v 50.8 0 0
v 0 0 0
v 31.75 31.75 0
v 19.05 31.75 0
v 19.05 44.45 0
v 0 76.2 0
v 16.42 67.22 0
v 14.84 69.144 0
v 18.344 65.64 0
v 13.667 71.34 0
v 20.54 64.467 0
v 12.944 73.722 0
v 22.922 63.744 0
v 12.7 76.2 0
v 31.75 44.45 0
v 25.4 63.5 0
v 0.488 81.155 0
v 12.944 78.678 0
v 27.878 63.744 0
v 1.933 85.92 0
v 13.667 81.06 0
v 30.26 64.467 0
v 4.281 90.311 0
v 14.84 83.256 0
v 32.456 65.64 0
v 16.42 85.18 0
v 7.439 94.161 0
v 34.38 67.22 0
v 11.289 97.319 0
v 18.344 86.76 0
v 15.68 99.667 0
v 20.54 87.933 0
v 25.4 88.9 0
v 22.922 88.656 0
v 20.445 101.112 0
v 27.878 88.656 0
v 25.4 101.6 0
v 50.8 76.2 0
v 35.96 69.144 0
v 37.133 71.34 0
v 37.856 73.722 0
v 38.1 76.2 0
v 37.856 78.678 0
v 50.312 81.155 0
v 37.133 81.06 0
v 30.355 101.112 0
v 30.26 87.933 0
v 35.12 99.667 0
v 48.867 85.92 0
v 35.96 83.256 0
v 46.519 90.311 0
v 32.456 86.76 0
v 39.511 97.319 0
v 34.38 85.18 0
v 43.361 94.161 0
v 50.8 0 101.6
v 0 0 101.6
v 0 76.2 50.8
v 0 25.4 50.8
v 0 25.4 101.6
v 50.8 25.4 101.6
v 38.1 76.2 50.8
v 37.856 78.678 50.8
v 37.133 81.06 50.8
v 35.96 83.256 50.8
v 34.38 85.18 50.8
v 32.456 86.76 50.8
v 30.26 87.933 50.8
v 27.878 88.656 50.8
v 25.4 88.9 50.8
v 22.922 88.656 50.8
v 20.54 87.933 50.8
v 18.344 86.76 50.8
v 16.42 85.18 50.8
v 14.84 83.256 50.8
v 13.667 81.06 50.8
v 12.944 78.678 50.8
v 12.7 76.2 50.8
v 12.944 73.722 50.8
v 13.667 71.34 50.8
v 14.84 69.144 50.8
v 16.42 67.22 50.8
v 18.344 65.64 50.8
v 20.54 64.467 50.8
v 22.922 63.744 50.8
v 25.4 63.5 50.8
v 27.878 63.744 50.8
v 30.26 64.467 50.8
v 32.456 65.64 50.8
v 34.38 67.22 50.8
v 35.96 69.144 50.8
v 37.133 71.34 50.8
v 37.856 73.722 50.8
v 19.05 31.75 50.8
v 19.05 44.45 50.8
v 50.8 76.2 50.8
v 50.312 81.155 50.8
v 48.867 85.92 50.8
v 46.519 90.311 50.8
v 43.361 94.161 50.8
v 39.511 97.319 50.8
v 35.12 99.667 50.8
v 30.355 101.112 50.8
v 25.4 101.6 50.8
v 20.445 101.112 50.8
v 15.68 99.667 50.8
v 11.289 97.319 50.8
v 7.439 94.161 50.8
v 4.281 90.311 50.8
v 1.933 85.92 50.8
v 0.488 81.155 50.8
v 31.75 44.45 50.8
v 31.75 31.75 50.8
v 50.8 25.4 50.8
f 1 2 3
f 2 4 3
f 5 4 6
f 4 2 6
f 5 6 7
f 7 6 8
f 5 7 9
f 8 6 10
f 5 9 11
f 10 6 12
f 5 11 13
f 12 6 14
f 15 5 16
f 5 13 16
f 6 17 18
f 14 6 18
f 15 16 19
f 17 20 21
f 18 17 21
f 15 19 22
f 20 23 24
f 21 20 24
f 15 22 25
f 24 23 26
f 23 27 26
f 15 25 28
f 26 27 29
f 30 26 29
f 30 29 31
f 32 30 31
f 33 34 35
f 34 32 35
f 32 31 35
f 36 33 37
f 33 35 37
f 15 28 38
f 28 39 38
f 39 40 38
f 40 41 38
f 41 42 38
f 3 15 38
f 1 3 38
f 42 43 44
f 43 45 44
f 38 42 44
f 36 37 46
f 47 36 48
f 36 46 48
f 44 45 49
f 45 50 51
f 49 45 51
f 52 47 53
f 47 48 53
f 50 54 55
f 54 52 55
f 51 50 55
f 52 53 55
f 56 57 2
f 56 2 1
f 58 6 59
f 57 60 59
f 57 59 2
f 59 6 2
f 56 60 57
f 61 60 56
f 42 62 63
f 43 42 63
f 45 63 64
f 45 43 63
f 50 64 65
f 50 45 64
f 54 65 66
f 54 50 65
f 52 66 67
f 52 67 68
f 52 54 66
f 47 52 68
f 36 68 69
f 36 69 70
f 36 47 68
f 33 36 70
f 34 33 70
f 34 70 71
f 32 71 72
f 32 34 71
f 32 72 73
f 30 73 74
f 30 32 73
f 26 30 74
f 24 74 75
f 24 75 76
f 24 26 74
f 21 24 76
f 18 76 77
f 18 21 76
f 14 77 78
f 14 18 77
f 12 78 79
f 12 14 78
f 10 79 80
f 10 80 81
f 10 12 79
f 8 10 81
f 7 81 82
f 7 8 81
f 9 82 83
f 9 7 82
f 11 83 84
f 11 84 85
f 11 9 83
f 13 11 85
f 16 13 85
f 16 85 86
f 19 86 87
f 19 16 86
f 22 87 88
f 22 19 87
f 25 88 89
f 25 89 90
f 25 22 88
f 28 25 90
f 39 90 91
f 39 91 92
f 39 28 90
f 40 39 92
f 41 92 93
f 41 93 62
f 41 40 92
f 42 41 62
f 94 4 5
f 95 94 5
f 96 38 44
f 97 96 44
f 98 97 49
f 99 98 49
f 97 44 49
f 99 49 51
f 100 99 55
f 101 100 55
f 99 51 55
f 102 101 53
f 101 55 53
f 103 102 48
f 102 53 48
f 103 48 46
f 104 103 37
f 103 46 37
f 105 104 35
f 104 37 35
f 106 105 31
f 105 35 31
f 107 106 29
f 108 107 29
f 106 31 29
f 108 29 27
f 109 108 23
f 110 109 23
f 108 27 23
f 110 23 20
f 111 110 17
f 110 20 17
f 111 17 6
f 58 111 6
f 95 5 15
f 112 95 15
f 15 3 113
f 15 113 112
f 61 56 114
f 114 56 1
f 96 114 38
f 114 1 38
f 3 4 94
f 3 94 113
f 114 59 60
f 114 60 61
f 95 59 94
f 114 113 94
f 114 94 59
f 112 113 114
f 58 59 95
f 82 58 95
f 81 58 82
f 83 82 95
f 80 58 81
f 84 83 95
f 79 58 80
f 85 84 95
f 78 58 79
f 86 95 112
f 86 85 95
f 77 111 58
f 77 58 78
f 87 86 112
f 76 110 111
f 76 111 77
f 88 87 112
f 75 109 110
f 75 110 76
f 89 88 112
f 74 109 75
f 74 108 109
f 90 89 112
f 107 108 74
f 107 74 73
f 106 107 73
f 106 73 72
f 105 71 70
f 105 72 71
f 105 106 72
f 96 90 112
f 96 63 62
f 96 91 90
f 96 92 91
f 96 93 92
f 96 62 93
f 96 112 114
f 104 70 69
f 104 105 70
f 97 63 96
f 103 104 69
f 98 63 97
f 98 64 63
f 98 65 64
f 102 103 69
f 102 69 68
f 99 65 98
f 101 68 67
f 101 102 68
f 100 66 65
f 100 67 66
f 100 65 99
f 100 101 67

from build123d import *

# Parameters (mm, degrees)
SKETCH2_R           = 12.7
SKETCH2_W           = 12.7
SKETCH2_H           = 12.7
BOSS_EXTRUDE1_DEPTH = 50.8
SKETCH3_W           = 50.8
SKETCH3_H           = 25.4
BOSS_EXTRUDE2_DEPTH = 101.6


with BuildPart() as part:
    # Sketch2 → Boss-Extrude1 (new body)
    with BuildSketch(Plane.XY):
        with BuildLine():
            Line((50.8, 25.4), (50.8, 76.2))
            ThreePointArc((50.8, 76.2), (25.4, 101.6), (0, 76.2))
            Line((0, 76.2), (0, 25.4))
            Line((0, 25.4), (0, 0))
            Line((0, 0), (50.8, 0))
            Line((50.8, 0), (50.8, 25.4))
        make_face()
        with Locations((25.4, 76.2)):
            Circle(SKETCH2_R, mode=Mode.SUBTRACT)
        with Locations((25.4, 38.1)):
            Rectangle(SKETCH2_W, SKETCH2_H, mode=Mode.SUBTRACT)
    extrude(amount=BOSS_EXTRUDE1_DEPTH)

    # Sketch3 → Boss-Extrude2 (add)
    with BuildSketch(Plane.XY):
        with Locations((25.4, 12.7)):
            Rectangle(SKETCH3_W, SKETCH3_H)
    extrude(amount=BOSS_EXTRUDE2_DEPTH)


solid = part.part
